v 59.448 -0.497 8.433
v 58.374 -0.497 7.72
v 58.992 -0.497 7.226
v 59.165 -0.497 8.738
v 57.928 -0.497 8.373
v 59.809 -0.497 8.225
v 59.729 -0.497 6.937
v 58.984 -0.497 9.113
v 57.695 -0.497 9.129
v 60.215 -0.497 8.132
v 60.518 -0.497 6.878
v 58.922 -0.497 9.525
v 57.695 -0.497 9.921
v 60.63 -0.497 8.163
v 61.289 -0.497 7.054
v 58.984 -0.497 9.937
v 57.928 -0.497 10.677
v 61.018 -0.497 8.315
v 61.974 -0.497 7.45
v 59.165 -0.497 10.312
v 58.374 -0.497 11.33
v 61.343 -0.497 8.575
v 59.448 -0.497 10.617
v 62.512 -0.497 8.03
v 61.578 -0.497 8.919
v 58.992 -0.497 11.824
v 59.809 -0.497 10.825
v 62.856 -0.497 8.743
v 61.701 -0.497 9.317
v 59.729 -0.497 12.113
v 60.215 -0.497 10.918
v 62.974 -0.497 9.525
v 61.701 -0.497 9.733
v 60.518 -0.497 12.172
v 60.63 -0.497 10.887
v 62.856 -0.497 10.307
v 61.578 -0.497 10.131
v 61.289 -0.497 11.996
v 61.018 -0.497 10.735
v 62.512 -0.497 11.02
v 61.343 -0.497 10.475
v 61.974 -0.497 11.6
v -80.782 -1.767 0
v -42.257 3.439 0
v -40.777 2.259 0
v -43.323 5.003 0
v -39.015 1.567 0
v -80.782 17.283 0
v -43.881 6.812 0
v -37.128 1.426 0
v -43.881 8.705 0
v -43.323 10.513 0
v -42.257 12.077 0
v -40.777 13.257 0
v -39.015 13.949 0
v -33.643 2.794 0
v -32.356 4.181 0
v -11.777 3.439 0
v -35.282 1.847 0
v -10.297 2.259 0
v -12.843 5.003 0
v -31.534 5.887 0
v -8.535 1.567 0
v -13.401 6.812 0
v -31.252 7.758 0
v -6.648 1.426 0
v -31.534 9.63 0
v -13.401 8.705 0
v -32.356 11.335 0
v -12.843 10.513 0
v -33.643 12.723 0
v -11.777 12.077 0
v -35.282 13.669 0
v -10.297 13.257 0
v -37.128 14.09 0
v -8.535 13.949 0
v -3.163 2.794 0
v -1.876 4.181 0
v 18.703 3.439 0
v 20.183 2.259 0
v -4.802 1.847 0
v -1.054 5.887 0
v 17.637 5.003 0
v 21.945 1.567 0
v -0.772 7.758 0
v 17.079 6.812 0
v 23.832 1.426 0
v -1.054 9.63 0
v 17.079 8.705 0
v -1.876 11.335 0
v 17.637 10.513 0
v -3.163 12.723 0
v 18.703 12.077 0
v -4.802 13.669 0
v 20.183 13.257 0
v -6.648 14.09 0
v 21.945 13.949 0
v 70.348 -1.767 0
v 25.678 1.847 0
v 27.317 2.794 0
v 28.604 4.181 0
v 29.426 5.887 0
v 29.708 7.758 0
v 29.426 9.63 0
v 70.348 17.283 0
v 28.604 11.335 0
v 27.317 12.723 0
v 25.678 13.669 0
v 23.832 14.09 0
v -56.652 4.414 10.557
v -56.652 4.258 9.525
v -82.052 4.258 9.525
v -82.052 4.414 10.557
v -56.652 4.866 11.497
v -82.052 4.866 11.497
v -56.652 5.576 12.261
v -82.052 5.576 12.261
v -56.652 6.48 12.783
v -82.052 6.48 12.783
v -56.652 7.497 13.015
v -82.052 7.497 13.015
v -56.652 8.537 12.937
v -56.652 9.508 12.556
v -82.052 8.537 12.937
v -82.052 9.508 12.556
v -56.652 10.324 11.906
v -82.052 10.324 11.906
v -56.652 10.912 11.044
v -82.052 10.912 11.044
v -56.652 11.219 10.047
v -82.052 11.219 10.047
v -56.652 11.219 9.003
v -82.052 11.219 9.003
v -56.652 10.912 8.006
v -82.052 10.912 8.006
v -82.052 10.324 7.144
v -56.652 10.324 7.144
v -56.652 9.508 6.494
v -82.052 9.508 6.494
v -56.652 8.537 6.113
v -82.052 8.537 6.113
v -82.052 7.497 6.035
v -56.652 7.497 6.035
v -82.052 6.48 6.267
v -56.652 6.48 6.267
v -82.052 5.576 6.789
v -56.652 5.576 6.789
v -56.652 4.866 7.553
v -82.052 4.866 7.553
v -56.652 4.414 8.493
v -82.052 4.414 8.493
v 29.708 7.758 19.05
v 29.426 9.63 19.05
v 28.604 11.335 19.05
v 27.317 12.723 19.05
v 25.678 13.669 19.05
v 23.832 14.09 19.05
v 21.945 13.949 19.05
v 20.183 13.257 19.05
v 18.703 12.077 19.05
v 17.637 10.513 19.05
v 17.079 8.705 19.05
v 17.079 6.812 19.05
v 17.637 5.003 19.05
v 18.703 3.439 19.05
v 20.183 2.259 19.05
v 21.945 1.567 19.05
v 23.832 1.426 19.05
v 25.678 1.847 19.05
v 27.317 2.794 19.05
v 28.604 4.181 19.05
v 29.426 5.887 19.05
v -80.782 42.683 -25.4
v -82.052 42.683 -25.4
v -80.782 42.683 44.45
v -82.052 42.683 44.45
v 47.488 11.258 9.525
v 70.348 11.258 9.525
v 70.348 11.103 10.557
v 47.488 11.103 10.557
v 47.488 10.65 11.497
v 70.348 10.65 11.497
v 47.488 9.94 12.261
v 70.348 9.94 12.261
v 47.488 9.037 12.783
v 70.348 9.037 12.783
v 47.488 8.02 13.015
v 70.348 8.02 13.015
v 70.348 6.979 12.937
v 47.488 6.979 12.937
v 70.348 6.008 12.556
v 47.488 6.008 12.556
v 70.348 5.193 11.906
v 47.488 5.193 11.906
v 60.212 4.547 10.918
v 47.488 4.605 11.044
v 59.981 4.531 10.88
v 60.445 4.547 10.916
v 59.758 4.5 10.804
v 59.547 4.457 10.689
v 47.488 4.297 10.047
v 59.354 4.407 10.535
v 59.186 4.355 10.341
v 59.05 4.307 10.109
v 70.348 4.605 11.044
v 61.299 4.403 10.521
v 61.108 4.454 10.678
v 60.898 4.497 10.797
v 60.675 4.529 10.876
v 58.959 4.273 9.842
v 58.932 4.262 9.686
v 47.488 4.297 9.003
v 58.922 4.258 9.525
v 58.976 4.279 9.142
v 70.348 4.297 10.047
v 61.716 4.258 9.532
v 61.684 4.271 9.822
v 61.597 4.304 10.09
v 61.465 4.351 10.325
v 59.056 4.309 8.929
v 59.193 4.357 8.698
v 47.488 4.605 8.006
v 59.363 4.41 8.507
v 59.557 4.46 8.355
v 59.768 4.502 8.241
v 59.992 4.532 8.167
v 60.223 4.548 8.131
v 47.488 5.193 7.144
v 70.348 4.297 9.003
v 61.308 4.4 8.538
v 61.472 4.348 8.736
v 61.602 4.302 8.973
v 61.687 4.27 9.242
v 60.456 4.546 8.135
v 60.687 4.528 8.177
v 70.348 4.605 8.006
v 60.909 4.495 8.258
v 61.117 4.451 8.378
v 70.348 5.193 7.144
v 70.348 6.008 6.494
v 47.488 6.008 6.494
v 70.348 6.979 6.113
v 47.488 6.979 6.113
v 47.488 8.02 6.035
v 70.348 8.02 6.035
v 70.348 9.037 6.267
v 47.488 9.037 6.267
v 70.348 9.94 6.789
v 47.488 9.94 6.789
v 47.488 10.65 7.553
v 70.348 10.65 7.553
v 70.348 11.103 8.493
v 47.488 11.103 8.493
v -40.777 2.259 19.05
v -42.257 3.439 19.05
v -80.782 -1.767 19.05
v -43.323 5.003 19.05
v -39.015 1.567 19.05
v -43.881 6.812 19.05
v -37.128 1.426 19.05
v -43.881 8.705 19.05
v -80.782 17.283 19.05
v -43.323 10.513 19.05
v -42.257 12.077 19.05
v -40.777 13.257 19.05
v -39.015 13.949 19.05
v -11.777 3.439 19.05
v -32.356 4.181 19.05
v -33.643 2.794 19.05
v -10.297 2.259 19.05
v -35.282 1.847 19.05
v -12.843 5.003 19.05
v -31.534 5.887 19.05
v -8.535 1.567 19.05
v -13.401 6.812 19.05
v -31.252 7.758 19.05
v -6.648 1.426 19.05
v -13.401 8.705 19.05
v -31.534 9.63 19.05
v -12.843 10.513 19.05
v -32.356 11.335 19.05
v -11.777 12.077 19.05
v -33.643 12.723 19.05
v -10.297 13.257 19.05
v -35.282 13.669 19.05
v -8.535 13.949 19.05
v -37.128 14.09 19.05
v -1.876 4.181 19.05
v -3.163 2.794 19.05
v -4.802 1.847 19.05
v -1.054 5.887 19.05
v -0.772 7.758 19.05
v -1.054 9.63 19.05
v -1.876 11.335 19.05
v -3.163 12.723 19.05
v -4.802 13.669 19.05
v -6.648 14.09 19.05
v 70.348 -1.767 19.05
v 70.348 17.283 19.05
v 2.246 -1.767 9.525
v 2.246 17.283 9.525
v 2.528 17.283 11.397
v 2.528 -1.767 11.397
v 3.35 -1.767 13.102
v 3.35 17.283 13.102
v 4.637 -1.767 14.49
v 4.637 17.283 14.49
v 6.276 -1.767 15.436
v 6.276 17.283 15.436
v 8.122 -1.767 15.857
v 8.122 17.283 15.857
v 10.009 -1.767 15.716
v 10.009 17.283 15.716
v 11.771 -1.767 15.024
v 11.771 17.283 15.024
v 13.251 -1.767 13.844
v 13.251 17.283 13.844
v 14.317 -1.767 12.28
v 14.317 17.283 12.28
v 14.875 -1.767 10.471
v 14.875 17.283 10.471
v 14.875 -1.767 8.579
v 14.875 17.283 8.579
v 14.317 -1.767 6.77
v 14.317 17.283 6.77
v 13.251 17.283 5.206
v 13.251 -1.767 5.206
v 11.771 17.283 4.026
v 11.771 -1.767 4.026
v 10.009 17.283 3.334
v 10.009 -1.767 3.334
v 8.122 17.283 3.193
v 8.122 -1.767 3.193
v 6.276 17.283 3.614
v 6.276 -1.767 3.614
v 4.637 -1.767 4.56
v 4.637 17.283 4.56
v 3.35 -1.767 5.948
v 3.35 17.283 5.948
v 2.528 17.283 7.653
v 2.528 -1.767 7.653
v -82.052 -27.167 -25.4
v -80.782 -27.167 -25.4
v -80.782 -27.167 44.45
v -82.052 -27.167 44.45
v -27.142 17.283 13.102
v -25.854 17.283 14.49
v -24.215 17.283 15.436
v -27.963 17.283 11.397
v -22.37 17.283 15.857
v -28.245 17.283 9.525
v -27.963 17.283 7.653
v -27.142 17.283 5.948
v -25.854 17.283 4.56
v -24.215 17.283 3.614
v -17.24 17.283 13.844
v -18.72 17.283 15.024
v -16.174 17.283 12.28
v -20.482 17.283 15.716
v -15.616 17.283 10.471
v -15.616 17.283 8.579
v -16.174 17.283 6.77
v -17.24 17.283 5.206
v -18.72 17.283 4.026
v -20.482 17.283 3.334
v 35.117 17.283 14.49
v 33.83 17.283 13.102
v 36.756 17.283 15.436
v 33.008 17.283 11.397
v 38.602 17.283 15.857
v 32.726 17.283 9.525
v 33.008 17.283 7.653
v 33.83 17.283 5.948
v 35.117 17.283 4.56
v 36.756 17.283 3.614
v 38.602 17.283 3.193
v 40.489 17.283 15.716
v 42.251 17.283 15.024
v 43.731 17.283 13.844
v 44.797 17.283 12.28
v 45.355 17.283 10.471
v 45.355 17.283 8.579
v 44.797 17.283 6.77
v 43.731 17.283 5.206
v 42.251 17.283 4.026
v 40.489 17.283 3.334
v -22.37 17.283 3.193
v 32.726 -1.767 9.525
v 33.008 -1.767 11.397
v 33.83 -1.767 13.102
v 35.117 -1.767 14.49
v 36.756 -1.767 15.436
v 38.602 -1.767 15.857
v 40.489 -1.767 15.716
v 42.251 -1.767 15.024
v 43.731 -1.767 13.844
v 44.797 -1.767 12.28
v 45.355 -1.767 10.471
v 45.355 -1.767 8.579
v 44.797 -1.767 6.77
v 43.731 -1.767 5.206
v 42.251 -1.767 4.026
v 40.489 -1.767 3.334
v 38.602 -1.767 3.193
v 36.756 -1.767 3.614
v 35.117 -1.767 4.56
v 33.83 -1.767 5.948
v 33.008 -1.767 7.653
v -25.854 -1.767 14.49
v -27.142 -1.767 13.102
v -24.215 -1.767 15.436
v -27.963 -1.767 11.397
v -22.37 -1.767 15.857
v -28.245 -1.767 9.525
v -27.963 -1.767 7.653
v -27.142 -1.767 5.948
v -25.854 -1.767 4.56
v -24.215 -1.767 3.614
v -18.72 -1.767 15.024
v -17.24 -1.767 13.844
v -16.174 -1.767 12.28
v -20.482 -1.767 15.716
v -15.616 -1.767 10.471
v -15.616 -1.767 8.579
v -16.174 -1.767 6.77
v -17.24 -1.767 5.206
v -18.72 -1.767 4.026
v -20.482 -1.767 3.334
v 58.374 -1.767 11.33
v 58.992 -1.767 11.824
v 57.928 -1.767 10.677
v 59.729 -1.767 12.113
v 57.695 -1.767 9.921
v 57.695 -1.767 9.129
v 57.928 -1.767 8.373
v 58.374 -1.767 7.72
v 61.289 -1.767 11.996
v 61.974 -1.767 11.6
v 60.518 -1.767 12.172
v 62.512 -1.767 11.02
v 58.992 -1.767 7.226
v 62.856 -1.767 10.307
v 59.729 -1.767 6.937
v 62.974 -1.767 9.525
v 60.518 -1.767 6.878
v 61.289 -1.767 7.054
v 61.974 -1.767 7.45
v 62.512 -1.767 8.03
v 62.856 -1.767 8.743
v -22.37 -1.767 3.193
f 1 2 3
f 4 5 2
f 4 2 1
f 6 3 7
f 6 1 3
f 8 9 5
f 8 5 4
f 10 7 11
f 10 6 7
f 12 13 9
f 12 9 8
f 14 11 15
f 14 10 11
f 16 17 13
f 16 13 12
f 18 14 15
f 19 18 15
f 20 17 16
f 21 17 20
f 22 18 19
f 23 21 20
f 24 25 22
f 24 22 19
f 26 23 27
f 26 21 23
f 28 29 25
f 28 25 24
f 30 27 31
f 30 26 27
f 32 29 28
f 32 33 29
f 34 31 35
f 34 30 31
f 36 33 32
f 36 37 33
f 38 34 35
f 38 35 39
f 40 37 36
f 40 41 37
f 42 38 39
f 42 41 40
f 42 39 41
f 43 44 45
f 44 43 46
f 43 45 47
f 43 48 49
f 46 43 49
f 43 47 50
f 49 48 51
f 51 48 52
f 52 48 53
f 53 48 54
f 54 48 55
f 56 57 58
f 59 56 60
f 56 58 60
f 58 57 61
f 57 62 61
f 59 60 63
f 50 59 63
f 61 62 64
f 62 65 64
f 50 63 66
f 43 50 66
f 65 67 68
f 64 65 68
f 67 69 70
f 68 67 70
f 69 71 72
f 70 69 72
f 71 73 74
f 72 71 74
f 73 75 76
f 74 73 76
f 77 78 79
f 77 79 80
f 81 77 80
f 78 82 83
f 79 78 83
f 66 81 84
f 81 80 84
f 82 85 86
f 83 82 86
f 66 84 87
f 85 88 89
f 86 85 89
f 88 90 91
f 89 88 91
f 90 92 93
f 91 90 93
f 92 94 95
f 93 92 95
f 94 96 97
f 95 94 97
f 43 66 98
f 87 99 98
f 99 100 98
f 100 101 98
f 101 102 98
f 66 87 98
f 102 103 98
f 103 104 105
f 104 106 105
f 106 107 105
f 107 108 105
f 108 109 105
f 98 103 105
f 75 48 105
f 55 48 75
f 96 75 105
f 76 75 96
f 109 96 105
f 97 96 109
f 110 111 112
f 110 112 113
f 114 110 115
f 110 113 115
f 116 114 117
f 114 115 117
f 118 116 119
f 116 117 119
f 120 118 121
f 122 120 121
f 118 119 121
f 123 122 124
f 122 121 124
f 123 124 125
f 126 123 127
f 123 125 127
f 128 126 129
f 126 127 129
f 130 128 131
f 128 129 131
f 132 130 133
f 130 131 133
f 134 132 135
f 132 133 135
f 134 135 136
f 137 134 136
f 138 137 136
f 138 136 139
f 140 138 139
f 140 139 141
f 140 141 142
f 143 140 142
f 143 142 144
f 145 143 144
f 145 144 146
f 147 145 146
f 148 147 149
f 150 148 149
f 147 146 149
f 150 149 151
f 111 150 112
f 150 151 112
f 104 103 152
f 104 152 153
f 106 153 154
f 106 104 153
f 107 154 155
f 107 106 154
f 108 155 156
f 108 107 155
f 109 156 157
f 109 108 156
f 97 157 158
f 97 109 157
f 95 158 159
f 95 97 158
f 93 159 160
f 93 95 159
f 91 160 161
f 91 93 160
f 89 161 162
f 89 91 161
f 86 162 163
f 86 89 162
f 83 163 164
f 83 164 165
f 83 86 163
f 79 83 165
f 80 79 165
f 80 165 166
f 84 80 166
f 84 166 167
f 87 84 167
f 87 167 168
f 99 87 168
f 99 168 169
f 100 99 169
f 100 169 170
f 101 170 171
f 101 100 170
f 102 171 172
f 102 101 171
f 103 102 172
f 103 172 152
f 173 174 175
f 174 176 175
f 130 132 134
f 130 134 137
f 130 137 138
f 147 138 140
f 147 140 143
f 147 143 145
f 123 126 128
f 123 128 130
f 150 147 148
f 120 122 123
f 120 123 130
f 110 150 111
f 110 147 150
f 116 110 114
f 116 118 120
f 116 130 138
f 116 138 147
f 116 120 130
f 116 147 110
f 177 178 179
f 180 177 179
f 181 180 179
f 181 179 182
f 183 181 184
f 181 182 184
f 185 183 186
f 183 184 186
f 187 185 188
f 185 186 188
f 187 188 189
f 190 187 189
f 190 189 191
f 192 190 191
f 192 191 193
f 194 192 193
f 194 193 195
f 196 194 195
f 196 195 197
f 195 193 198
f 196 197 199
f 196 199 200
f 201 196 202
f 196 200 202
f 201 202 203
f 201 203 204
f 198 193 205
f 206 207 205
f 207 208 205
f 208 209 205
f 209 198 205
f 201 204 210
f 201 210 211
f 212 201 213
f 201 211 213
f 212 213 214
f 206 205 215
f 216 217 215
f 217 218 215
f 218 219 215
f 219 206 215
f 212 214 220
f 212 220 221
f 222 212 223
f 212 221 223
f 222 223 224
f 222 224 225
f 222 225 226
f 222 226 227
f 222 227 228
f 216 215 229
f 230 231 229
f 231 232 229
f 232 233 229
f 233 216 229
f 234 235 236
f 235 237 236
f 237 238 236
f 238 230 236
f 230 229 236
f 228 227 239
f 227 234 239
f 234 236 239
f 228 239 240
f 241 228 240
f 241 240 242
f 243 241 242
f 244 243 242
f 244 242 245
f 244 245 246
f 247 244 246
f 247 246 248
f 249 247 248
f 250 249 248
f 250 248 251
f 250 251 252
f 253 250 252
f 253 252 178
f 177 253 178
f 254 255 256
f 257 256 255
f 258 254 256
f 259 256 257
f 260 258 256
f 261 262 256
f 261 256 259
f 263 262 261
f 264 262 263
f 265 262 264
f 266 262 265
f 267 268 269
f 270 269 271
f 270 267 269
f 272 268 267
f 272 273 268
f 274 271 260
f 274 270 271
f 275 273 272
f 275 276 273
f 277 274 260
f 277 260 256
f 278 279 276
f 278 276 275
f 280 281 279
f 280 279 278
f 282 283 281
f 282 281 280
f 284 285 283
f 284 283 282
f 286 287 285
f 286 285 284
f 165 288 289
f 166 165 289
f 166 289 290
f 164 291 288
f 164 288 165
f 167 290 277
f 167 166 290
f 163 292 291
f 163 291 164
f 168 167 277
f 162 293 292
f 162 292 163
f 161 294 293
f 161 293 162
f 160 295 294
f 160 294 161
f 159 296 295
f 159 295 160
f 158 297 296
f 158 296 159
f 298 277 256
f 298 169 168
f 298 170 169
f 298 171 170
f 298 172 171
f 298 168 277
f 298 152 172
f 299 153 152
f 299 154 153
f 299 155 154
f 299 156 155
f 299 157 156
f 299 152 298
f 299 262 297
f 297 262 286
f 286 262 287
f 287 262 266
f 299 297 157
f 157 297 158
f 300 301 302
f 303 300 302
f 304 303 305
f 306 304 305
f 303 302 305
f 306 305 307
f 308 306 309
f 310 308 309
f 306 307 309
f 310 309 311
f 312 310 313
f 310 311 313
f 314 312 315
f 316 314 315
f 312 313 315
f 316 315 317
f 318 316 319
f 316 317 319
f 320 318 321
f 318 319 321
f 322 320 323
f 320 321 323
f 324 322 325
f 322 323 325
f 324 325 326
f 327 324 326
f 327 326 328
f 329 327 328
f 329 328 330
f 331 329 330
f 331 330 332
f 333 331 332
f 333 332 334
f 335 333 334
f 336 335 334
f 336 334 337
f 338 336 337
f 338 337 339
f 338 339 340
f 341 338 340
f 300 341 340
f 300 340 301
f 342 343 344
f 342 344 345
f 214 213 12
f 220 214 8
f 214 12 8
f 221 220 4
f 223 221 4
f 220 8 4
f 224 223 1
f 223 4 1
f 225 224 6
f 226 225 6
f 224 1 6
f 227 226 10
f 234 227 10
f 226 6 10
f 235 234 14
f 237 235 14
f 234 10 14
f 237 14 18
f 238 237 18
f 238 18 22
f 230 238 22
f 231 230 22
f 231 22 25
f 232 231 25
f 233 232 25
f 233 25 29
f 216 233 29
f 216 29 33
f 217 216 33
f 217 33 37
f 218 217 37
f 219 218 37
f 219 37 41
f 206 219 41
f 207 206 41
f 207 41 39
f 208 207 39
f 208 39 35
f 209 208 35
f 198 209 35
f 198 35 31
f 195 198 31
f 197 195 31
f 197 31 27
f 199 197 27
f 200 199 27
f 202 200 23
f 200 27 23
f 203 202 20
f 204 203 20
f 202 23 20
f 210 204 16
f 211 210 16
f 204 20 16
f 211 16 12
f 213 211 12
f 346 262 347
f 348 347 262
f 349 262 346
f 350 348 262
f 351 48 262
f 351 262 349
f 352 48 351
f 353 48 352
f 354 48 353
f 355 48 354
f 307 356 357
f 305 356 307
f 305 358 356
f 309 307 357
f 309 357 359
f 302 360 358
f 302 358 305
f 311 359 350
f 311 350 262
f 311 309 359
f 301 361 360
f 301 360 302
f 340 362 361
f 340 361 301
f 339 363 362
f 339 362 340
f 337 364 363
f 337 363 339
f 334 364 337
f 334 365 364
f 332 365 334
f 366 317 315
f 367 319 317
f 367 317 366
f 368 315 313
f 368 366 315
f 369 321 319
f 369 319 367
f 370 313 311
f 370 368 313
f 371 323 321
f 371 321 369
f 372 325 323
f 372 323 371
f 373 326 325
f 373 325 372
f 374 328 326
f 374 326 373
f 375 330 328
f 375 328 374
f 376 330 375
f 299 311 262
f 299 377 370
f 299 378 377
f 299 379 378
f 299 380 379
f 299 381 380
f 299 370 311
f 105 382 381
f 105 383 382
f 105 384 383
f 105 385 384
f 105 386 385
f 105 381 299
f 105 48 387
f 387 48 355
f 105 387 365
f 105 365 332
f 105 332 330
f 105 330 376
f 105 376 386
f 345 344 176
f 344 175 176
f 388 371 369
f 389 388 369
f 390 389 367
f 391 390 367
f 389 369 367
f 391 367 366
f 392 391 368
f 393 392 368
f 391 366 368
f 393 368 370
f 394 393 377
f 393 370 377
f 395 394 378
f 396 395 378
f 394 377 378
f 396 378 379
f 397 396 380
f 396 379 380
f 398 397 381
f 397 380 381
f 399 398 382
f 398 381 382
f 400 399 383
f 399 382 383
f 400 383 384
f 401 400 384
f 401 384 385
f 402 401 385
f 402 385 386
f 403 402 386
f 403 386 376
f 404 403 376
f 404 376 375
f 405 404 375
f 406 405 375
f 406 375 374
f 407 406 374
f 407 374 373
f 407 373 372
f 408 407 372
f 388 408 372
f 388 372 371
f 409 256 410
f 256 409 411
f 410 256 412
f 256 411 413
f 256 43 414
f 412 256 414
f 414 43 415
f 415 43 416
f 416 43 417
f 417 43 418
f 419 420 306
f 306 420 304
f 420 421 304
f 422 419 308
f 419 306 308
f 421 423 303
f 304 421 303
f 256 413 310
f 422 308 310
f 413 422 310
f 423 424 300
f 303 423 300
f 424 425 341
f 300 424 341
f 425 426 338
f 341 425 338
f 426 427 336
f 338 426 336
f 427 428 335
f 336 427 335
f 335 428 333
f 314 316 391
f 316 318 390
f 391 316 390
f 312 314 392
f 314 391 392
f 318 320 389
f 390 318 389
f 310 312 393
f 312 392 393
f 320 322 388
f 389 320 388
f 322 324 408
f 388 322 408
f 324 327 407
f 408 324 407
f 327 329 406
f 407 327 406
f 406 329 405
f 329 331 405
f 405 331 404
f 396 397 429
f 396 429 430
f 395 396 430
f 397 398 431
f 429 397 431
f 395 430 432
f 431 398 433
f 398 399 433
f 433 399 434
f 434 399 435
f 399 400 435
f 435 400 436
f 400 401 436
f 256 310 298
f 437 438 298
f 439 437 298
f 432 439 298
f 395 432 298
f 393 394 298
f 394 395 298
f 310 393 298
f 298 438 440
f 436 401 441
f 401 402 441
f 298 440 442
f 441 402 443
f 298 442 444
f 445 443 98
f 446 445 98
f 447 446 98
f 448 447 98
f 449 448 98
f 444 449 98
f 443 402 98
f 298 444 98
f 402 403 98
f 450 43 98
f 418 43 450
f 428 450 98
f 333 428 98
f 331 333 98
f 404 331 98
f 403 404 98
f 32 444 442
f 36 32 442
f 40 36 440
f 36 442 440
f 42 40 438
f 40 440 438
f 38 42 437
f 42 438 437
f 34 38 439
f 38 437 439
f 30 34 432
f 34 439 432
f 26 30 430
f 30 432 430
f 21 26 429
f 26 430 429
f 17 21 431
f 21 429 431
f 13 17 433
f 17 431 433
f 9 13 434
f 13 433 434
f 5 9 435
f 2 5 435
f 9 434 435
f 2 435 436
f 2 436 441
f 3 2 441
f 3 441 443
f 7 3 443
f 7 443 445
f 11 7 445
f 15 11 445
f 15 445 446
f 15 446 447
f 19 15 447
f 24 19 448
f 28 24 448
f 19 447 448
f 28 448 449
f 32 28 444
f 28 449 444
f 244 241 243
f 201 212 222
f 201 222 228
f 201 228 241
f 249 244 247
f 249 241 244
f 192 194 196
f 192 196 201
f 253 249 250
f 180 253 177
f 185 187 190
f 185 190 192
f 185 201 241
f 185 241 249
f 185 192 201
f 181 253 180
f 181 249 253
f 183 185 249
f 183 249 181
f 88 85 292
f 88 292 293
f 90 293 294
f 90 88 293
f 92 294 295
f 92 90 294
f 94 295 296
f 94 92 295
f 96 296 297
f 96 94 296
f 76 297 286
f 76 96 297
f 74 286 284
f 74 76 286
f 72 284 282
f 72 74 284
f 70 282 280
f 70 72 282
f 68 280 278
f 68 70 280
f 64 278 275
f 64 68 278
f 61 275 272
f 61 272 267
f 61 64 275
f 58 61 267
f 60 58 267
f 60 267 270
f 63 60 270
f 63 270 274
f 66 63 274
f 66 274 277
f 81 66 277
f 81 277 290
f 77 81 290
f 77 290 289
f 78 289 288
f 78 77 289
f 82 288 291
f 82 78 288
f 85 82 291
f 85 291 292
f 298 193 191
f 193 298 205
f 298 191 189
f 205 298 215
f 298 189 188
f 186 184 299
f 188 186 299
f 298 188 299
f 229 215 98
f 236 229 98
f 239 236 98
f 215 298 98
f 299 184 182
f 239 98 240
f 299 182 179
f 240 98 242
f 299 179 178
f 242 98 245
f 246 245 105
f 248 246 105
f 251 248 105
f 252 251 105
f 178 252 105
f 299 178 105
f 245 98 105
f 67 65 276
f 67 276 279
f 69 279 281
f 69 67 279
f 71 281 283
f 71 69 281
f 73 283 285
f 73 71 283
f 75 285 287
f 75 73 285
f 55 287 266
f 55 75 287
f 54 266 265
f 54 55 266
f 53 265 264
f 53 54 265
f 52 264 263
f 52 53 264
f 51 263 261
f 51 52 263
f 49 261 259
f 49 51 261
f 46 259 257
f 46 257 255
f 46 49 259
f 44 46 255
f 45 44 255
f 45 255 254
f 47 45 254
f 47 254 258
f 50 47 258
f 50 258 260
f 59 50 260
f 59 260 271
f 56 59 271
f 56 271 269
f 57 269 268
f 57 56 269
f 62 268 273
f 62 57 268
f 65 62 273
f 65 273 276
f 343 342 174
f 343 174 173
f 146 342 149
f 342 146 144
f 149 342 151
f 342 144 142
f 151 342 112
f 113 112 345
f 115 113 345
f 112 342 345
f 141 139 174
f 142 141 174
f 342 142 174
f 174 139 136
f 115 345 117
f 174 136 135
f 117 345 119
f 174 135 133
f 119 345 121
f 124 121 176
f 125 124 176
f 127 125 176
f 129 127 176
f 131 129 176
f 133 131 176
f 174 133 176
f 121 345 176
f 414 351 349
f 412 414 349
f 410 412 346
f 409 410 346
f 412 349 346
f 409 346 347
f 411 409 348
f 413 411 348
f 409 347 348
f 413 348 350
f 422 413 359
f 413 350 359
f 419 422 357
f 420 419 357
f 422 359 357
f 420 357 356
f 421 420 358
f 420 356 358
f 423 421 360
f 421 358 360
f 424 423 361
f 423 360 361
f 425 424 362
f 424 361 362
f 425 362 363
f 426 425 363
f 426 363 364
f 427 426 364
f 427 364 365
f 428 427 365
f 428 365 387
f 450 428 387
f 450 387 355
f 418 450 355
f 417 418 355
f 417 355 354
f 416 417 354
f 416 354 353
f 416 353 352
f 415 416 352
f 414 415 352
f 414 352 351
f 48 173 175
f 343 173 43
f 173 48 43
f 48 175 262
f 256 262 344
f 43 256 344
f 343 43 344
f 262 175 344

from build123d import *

# Parameters (mm, degrees)
F0_W      = 152.4
F0_H      = 19.05
F0_R      = 6.35
F1_DEPTH  = 19.05
F2_R      = 6.35
F3_DEPTH  = 25.4
F4_R      = 3.5000057
F5_DEPTH  = 25.4
F6_R      = 3.5000057
F7_DEPTH  = 22.86
F8_W      = 1.27
F8_H      = 19.05
F9_DEPTH  = 25.4
F11_DEPTH = 25.4
F13_DEPTH = 25.4
F15_DEPTH = 25.4
F17_DEPTH = 7.62
F18_DEPTH = 1.27


with BuildPart() as f1:
    # F0 (on Top) → F1 (new body)
    with BuildSketch(Plane.XY):
        with Locations((-5.8522596955, 7.7582320684)):
            Rectangle(F0_W, F0_H)
        with Locations((-37.6022596955, 7.7582320684)):
            Circle(F0_R, mode=Mode.SUBTRACT)
        with Locations((-7.1222596955, 7.7582320684)):
            Circle(F0_R, mode=Mode.SUBTRACT)
        with Locations((23.3577403045, 7.7582320684)):
            Circle(F0_R, mode=Mode.SUBTRACT)
    extrude(amount=F1_DEPTH)

    # F2 (on face) → F3 (cut)
    with BuildSketch(Plane(origin=(0, 17.2832320684, 0), x_dir=(-1, 0, 0), z_dir=(0, 1, 0))):
        with Locations((21.8949988484, 9.525)):
            Circle(F2_R)
        with Locations((-39.0761239581, 9.525)):
            Circle(F2_R)
        with Locations((-8.5961239581, 9.525)):
            Circle(F2_R)
    extrude(amount=-F3_DEPTH, mode=Mode.SUBTRACT)

    # F4 (on face) → F5 (cut)
    with BuildSketch(Plane(origin=(-82.0522596955, 0, 0), x_dir=(0, -1, 0), z_dir=(-1, 0, 0))):
        with Locations((-7.7582320684, 9.525)):
            Circle(F4_R)
    extrude(amount=-F5_DEPTH, mode=Mode.SUBTRACT)

    # F6 (on face) → F7 (cut)
    with BuildSketch(Plane.YZ.offset(70.3477403045)):
        with Locations((7.7582320684, 9.525)):
            Circle(F6_R)
    extrude(amount=-F7_DEPTH, mode=Mode.SUBTRACT)

    # F8 (on face) → F9 (join)
    with BuildSketch(Plane.XY.offset(19.05)):
        with Locations((-81.4172596955, 7.7582320684)):
            Rectangle(F8_W, F8_H)
    extrude(amount=F9_DEPTH)

    # F10 (on face) → F11 (join)
    with BuildSketch(Plane(origin=(0, 17.2832320684, 0), x_dir=(-1, 0, 0), z_dir=(0, 1, 0))):
        Polygon((80.7822596955, 44.45), (80.7822596955, 19.05), (80.7822596955, 0), (82.0522596955, 0), (82.0522596955, 44.45), align=None)
    extrude(amount=F11_DEPTH)

    # F12 (on face) → F13 (join)
    with BuildSketch(Plane.XZ.offset(1.7667679316)):
        Polygon((-80.7822596955, 0), (-80.7822596955, 19.05), (-80.7822596955, 44.45), (-82.0522596955, 44.45), (-82.0522596955, 0), align=None)
    extrude(amount=F13_DEPTH)

    # F14 (on face) → F15 (join)
    with BuildSketch(Plane(origin=(0, 0, 0), x_dir=(1, 0, 0), z_dir=(0, 0, -1))):
        Polygon((-80.7822596955, -17.2832320684), (-80.7822596955, 1.7667679316), (-80.7822596955, 27.1667679316), (-82.0522596955, 27.1667679316), (-82.0522596955, -42.6832320684), (-80.7822596955, -42.6832320684), align=None)
    extrude(amount=F15_DEPTH)

    # F16 (on face) → F17 (cut)
    with BuildSketch(Plane.XZ.offset(1.7667679316)):
        with BuildLine():
            Line((58.9223379939, 9.525), (61.7163379939, 9.525))
            ThreePointArc((61.7163379939, 9.525), (60.3193379939, 10.922), (58.9223379939, 9.525))
        make_face()
        with BuildLine():
            ThreePointArc((58.9223379939, 9.525), (60.3193379939, 8.128), (61.7163379939, 9.525))
            Line((61.7163379939, 9.525), (58.9223379939, 9.525))
        make_face()
    extrude(amount=-F17_DEPTH, mode=Mode.SUBTRACT)

    # F16 (on face) → F18 (cut)
    with BuildSketch(Plane.XZ.offset(1.7667679316)):
        with BuildLine():
            ThreePointArc((57.6650379939, 9.525), (60.3193379939, 6.8707), (62.9736379939, 9.525))
            Line((62.9736379939, 9.525), (61.7163379939, 9.525))
            ThreePointArc((61.7163379939, 9.525), (60.3193379939, 8.128), (58.9223379939, 9.525))
            Line((58.9223379939, 9.525), (57.6650379939, 9.525))
        make_face()
        with BuildLine():
            Line((61.7163379939, 9.525), (62.9736379939, 9.525))
            ThreePointArc((62.9736379939, 9.525), (60.3193379939, 12.1793), (57.6650379939, 9.525))
            Line((57.6650379939, 9.525), (58.9223379939, 9.525))
            ThreePointArc((58.9223379939, 9.525), (60.3193379939, 10.922), (61.7163379939, 9.525))
        make_face()
    extrude(amount=-F18_DEPTH, mode=Mode.SUBTRACT)


solid = f1.part
